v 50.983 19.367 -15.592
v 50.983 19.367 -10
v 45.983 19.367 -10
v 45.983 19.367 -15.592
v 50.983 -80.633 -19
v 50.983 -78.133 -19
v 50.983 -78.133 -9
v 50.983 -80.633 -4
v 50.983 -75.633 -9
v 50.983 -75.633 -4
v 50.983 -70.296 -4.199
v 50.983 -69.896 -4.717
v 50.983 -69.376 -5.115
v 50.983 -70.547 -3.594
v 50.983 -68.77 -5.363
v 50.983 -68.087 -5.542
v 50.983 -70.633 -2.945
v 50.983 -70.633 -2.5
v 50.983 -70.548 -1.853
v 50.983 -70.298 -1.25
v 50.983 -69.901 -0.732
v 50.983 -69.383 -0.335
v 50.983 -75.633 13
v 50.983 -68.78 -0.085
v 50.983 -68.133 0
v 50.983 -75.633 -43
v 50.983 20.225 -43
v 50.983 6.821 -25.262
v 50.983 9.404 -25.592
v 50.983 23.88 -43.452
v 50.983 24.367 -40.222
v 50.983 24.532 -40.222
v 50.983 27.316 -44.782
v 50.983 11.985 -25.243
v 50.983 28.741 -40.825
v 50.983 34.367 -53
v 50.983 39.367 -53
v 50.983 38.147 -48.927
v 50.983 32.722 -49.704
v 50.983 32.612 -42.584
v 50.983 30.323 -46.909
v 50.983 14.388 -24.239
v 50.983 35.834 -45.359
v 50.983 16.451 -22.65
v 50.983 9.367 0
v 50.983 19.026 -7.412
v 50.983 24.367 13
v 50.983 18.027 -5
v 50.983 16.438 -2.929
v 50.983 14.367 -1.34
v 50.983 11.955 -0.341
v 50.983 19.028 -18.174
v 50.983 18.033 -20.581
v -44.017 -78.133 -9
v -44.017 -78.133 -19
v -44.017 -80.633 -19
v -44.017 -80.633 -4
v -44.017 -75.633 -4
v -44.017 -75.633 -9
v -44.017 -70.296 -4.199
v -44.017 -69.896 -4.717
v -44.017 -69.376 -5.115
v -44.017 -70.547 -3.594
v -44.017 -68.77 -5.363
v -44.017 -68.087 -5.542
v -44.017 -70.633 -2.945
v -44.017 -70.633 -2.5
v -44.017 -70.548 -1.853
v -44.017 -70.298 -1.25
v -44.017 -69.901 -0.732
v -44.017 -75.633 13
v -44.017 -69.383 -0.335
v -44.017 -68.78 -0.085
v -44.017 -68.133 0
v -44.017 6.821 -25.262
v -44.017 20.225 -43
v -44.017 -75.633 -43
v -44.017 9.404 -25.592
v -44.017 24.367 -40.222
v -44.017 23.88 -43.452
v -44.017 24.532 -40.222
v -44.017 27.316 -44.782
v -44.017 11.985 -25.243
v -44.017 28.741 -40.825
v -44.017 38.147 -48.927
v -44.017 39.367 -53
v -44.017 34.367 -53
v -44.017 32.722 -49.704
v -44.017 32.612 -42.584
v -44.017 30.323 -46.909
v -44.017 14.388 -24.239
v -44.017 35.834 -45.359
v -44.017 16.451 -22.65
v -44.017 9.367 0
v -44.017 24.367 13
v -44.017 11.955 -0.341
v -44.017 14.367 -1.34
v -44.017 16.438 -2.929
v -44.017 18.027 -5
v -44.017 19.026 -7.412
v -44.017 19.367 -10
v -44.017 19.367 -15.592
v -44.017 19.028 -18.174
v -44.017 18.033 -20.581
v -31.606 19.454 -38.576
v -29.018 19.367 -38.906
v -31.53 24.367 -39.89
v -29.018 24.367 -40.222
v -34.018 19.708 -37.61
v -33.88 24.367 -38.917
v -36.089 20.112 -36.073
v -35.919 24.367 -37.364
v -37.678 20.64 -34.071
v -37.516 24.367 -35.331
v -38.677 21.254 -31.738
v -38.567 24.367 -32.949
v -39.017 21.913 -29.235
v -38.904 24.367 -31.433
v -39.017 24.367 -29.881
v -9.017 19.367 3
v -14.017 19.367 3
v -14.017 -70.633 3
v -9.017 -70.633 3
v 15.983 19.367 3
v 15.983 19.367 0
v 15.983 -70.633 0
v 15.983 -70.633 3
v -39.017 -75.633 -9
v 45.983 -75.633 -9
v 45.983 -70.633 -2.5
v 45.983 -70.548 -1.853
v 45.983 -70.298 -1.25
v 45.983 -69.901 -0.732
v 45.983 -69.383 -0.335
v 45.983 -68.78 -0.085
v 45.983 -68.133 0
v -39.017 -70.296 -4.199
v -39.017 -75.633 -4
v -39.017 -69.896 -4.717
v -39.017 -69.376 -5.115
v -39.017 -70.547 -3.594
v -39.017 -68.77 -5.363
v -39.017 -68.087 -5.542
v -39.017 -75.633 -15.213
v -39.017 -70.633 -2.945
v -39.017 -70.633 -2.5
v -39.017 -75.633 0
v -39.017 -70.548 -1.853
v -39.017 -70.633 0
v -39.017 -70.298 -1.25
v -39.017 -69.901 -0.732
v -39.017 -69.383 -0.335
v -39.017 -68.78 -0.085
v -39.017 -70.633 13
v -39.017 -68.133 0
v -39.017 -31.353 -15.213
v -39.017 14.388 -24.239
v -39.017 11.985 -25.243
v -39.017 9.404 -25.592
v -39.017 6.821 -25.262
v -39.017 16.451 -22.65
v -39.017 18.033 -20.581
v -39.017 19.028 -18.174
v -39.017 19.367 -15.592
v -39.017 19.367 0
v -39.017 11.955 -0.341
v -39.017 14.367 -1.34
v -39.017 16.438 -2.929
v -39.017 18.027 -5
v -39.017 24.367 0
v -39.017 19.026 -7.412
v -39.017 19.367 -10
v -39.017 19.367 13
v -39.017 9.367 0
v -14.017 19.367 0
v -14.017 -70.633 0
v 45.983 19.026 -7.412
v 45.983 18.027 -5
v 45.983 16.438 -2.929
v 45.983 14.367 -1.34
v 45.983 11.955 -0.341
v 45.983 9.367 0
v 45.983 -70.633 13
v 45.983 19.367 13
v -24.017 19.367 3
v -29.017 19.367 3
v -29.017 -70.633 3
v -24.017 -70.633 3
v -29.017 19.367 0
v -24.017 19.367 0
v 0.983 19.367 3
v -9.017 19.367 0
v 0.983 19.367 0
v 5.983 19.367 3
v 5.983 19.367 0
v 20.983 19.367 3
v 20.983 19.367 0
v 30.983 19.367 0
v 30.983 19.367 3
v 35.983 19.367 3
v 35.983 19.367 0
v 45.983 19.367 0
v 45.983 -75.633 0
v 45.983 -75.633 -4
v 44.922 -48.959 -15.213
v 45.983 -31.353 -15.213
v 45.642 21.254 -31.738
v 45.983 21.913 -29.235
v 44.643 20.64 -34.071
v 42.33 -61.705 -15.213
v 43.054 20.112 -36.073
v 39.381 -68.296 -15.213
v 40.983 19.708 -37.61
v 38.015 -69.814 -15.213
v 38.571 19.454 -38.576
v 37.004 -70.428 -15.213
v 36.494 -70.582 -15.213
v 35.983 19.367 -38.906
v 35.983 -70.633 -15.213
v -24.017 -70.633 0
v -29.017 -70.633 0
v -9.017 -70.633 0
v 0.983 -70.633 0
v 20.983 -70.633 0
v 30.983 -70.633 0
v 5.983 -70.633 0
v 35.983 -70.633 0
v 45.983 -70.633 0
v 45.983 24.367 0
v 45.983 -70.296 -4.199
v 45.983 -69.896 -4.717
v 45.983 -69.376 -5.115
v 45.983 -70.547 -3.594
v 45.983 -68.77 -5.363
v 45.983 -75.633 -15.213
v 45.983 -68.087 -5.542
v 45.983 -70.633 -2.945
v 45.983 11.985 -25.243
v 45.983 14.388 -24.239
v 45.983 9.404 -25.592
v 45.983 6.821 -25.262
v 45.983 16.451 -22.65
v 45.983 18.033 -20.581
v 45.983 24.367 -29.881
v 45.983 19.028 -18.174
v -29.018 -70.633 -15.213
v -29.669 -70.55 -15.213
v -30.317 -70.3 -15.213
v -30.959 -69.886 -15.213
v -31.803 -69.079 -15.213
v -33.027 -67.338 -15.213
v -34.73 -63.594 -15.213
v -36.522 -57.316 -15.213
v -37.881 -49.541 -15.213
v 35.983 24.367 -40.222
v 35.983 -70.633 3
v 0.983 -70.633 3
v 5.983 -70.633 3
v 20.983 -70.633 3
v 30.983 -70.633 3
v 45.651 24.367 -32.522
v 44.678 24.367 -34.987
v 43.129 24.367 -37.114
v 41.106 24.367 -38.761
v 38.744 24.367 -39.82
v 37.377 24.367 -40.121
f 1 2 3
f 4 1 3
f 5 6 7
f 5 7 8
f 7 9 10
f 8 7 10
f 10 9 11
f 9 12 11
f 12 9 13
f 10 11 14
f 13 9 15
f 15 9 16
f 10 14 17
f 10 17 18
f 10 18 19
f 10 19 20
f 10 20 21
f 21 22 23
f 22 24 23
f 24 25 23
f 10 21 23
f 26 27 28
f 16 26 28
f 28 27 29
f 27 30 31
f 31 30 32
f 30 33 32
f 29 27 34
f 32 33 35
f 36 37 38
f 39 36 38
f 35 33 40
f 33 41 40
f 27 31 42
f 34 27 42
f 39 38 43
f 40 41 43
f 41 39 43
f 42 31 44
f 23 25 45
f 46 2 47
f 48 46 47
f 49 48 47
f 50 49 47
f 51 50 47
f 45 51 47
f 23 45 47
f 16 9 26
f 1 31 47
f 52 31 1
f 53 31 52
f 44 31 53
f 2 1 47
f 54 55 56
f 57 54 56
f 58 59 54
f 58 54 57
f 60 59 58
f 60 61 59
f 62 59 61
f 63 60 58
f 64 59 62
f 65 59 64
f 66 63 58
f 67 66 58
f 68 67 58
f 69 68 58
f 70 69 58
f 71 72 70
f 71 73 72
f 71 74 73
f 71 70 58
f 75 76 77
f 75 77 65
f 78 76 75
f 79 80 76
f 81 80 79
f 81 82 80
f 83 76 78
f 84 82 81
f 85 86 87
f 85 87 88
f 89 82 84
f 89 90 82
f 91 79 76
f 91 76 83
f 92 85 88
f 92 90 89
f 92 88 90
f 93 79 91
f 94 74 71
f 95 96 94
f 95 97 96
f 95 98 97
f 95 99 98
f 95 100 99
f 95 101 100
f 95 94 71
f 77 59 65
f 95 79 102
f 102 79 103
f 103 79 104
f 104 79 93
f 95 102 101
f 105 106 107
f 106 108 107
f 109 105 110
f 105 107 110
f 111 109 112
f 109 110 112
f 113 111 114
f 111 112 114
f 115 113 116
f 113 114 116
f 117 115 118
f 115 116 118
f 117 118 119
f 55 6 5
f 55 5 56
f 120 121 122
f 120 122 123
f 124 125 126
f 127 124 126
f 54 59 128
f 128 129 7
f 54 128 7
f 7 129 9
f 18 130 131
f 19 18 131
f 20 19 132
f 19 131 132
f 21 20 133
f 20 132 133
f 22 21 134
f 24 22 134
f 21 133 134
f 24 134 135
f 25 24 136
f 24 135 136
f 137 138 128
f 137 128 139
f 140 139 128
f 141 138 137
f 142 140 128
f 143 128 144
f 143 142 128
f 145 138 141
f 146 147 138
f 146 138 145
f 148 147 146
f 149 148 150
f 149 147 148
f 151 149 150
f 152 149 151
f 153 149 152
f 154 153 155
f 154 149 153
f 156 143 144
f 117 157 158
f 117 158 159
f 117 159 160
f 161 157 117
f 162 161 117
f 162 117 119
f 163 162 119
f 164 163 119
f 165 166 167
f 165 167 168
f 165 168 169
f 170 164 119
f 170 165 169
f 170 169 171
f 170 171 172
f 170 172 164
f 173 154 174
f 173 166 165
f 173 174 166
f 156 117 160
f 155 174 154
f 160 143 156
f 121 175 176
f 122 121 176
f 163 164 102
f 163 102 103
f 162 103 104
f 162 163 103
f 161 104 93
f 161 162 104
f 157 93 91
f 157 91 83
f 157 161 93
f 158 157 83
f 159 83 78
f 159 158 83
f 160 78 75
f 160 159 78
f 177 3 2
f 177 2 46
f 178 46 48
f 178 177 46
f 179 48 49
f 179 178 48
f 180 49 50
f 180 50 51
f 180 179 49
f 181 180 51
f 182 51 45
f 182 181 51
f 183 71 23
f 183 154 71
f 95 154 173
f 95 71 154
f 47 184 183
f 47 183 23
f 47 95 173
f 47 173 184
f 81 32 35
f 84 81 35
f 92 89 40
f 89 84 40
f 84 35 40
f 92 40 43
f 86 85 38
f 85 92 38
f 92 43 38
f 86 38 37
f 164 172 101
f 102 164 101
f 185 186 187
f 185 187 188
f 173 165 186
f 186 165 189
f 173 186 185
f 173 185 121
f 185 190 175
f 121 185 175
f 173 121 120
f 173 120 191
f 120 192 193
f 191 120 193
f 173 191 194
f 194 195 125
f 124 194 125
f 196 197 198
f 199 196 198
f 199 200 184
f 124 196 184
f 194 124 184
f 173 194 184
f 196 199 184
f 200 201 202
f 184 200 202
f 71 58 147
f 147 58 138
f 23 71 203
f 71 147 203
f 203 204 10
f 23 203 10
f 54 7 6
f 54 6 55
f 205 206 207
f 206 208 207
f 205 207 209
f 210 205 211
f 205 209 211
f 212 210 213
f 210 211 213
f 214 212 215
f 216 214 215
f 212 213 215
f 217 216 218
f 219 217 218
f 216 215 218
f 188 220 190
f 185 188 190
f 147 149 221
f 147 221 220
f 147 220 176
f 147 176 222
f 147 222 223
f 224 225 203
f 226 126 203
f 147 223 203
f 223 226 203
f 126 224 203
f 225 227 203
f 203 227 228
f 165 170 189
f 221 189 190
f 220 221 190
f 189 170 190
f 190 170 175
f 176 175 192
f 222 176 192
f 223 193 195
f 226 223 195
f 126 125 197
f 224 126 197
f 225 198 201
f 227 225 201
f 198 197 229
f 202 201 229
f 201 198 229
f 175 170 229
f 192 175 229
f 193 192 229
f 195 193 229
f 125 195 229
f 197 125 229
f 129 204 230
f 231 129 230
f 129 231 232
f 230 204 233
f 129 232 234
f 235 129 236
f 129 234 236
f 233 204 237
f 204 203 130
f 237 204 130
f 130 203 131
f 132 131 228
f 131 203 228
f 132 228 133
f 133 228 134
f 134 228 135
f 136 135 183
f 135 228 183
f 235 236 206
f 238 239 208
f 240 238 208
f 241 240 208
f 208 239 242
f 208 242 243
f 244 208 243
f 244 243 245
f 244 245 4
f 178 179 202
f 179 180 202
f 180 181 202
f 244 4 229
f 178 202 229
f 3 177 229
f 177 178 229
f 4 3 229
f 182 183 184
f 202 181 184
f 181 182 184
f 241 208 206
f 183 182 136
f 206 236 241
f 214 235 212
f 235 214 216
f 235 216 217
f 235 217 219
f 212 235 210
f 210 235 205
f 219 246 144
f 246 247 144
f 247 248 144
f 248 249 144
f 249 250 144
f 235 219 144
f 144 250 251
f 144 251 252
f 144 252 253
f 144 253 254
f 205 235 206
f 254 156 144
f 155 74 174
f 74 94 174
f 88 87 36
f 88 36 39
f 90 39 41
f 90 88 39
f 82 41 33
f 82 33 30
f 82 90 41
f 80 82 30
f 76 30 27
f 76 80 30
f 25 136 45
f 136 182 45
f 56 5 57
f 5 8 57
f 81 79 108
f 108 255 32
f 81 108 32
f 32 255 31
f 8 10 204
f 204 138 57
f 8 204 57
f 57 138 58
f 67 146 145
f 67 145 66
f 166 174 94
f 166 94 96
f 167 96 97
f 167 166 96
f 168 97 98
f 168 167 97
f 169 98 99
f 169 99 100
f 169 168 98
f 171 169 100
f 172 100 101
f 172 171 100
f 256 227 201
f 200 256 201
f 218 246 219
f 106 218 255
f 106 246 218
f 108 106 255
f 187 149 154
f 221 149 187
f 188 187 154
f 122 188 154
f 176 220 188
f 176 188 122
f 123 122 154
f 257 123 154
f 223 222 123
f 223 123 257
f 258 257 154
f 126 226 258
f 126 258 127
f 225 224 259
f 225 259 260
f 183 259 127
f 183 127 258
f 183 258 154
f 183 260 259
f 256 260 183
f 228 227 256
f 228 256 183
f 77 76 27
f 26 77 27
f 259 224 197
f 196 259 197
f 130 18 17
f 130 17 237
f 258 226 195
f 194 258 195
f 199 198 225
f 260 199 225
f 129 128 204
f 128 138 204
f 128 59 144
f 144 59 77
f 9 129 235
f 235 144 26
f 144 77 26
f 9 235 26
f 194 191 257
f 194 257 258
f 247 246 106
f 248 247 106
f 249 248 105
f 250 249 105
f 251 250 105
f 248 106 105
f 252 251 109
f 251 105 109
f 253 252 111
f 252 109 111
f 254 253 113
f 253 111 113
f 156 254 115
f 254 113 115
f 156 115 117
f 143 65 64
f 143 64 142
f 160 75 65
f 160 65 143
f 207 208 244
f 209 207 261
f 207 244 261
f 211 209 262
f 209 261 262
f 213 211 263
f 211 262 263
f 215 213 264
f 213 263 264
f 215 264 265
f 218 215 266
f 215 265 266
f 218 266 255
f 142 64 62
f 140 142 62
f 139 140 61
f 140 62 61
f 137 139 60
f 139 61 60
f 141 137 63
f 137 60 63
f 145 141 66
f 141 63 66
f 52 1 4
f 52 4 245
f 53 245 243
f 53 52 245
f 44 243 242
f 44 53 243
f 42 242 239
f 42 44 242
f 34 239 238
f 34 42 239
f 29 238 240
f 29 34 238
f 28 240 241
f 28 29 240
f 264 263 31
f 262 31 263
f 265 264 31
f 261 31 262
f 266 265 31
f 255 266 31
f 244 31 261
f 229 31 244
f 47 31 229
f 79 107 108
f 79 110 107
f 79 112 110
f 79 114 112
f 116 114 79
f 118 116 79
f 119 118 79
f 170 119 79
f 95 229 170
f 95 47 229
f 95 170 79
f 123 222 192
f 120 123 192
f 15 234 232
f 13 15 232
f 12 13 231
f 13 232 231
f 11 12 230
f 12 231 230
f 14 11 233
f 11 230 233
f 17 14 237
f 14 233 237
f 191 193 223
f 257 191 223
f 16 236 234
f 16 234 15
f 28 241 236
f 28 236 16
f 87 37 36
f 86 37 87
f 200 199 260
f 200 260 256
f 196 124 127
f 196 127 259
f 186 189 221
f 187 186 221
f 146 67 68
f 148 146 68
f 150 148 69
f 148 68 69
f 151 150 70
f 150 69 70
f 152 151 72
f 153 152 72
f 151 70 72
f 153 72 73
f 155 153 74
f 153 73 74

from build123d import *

# Parameters (mm, degrees)
SKETCH1_W                = 5
SKETCH1_H                = 90
SKETCH1_H_2              = 5
SKETCH1_W_2              = 10
BOSS_EXTRUDE1_DEPTH      = 3
SKETCH1_3_W              = 5
SKETCH1_3_H              = 5
SKETCH1_3_H_2            = 90
SKETCH1_3_W_2            = 10
BOSS_EXTRUDE2_DEPTH      = 13
SKETCH2_W                = 5
SKETCH2_H                = 5
BOSS_EXTRUDE3_DEPTH      = 33
BOSS_EXTRUDE4_DEPTH      = 10
BOSS_EXTRUDE4_DEPTH_BACK = 17.787183465
SKETCH3_W                = 95
SKETCH3_H                = 100
SKETCH7_W                = 85
SKETCH7_H                = 5
SKETCH7_W_2              = 5
BOSS_EXTRUDE6_DEPTH      = 5
SKETCH8_W                = 95
SKETCH8_H                = 2.5
BOSS_EXTRUDE7_DEPTH      = 10
CUT_EXTRUDE1_DEPTH       = 132.816960102
BOSS_EXTRUDE9_REACH      = 101.483
SKETCH9_W                = 5
SKETCH9_H                = 5
SKETCH11_W               = 5
SKETCH11_H               = 93.06639607
BOSS_EXTRUDE12_DEPTH     = 10
SKETCH13_W               = 5
SKETCH13_H               = 10
BOSS_EXTRUDE13_DEPTH     = 4
FILLET2_R                = 10
FILLET3_START            = -44.017467249
FILLET3_DEPTH            = 5
FILLET3_START_2          = 45.982532751
FILLET3_2_DEPTH          = 5
FILLET4_R                = 10
SKETCH14_W               = 95
SKETCH14_H               = 2.777998613
BOSS_EXTRUDE14_DEPTH     = 15
SKETCH15_W               = 95
SKETCH15_H               = 5
BOSS_EXTRUDE15_DEPTH     = 10
FILLET5_R                = 15


with BuildPart() as part:
    # Sketch1 → Boss-Extrude1 (new body)
    with BuildSketch(Plane.XY):
        with Locations((48.482532751, -25.633187773)):
            Rectangle(SKETCH1_W, SKETCH1_H)
        with Locations((48.482532751, 21.866812227)):
            Rectangle(SKETCH1_W, SKETCH1_H_2)
        with Locations((40.982532751, 21.866812227)):
            Rectangle(SKETCH1_W_2, SKETCH1_H_2)
        with Locations((33.482532751, 21.866812227)):
            Rectangle(SKETCH1_W, SKETCH1_H_2)
        with Locations((33.482532751, -25.633187773)):
            Rectangle(SKETCH1_W, SKETCH1_H)
        with Locations((18.482532751, -25.633187773)):
            Rectangle(SKETCH1_W, SKETCH1_H)
        with Locations((18.482532751, 21.866812227)):
            Rectangle(SKETCH1_W, SKETCH1_H_2)
        with Locations((25.982532751, 21.866812227)):
            Rectangle(SKETCH1_W_2, SKETCH1_H_2)
        with Locations((10.982532751, 21.866812227)):
            Rectangle(SKETCH1_W_2, SKETCH1_H_2)
        with Locations((3.482532751, 21.866812227)):
            Rectangle(SKETCH1_W, SKETCH1_H_2)
        with Locations((3.482532751, -25.633187773)):
            Rectangle(SKETCH1_W, SKETCH1_H)
        with Locations((-4.017467249, 21.866812227)):
            Rectangle(SKETCH1_W_2, SKETCH1_H_2)
        with Locations((-11.517467249, 21.866812227)):
            Rectangle(SKETCH1_W, SKETCH1_H_2)
        with Locations((-11.517467249, -25.633187773)):
            Rectangle(SKETCH1_W, SKETCH1_H)
        with Locations((-19.017467249, 21.866812227)):
            Rectangle(SKETCH1_W_2, SKETCH1_H_2)
        with Locations((-26.517467249, 21.866812227)):
            Rectangle(SKETCH1_W, SKETCH1_H_2)
        with Locations((-26.517467249, -25.633187773)):
            Rectangle(SKETCH1_W, SKETCH1_H)
        with Locations((-34.017467249, 21.866812227)):
            Rectangle(SKETCH1_W_2, SKETCH1_H_2)
        with Locations((-41.517467249, 21.866812227)):
            Rectangle(SKETCH1_W, SKETCH1_H_2)
        with Locations((-41.517467249, -25.633187773)):
            Rectangle(SKETCH1_W, SKETCH1_H)
        with Locations((48.482532751, -73.133187773)):
            Rectangle(SKETCH1_W, SKETCH1_H_2)
        with Locations((40.982532751, -73.133187773)):
            Rectangle(SKETCH1_W_2, SKETCH1_H_2)
        with Locations((33.482532751, -73.133187773)):
            Rectangle(SKETCH1_W, SKETCH1_H_2)
        with Locations((25.982532751, -73.133187773)):
            Rectangle(SKETCH1_W_2, SKETCH1_H_2)
        with Locations((18.482532751, -73.133187773)):
            Rectangle(SKETCH1_W, SKETCH1_H_2)
        with Locations((10.982532751, -73.133187773)):
            Rectangle(SKETCH1_W_2, SKETCH1_H_2)
        with Locations((3.482532751, -73.133187773)):
            Rectangle(SKETCH1_W, SKETCH1_H_2)
        with Locations((-4.017467249, -73.133187773)):
            Rectangle(SKETCH1_W_2, SKETCH1_H_2)
        with Locations((-11.517467249, -73.133187773)):
            Rectangle(SKETCH1_W, SKETCH1_H_2)
        with Locations((-19.017467249, -73.133187773)):
            Rectangle(SKETCH1_W_2, SKETCH1_H_2)
        with Locations((-26.517467249, -73.133187773)):
            Rectangle(SKETCH1_W, SKETCH1_H_2)
        with Locations((-34.017467249, -73.133187773)):
            Rectangle(SKETCH1_W_2, SKETCH1_H_2)
        with Locations((-41.517467249, -73.133187773)):
            Rectangle(SKETCH1_W, SKETCH1_H_2)
    extrude(amount=BOSS_EXTRUDE1_DEPTH)

    # Sketch1<3> → Boss-Extrude2 (add)
    with BuildSketch(Plane.XY):
        with Locations((48.482532751, 21.866812227)):
            Rectangle(SKETCH1_3_W, SKETCH1_3_H)
        with Locations((48.482532751, -25.633187773)):
            Rectangle(SKETCH1_3_W, SKETCH1_3_H_2)
        with Locations((48.482532751, -73.133187773)):
            Rectangle(SKETCH1_3_W, SKETCH1_3_H)
        with Locations((40.982532751, 21.866812227)):
            Rectangle(SKETCH1_3_W_2, SKETCH1_3_H)
        with Locations((33.482532751, 21.866812227)):
            Rectangle(SKETCH1_3_W, SKETCH1_3_H)
        with Locations((25.982532751, 21.866812227)):
            Rectangle(SKETCH1_3_W_2, SKETCH1_3_H)
        with Locations((18.482532751, 21.866812227)):
            Rectangle(SKETCH1_3_W, SKETCH1_3_H)
        with Locations((10.982532751, 21.866812227)):
            Rectangle(SKETCH1_3_W_2, SKETCH1_3_H)
        with Locations((3.482532751, 21.866812227)):
            Rectangle(SKETCH1_3_W, SKETCH1_3_H)
        with Locations((-4.017467249, 21.866812227)):
            Rectangle(SKETCH1_3_W_2, SKETCH1_3_H)
        with Locations((-11.517467249, 21.866812227)):
            Rectangle(SKETCH1_3_W, SKETCH1_3_H)
        with Locations((-19.017467249, 21.866812227)):
            Rectangle(SKETCH1_3_W_2, SKETCH1_3_H)
        with Locations((-26.517467249, 21.866812227)):
            Rectangle(SKETCH1_3_W, SKETCH1_3_H)
        with Locations((-34.017467249, 21.866812227)):
            Rectangle(SKETCH1_3_W_2, SKETCH1_3_H)
        with Locations((-41.517467249, 21.866812227)):
            Rectangle(SKETCH1_3_W, SKETCH1_3_H)
        with Locations((-41.517467249, -25.633187773)):
            Rectangle(SKETCH1_3_W, SKETCH1_3_H_2)
        with Locations((-41.517467249, -73.133187773)):
            Rectangle(SKETCH1_3_W, SKETCH1_3_H)
        with Locations((40.982532751, -73.133187773)):
            Rectangle(SKETCH1_3_W_2, SKETCH1_3_H)
        with Locations((33.482532751, -73.133187773)):
            Rectangle(SKETCH1_3_W, SKETCH1_3_H)
        with Locations((25.982532751, -73.133187773)):
            Rectangle(SKETCH1_3_W_2, SKETCH1_3_H)
        with Locations((18.482532751, -73.133187773)):
            Rectangle(SKETCH1_3_W, SKETCH1_3_H)
        with Locations((10.982532751, -73.133187773)):
            Rectangle(SKETCH1_3_W_2, SKETCH1_3_H)
        with Locations((3.482532751, -73.133187773)):
            Rectangle(SKETCH1_3_W, SKETCH1_3_H)
        with Locations((-4.017467249, -73.133187773)):
            Rectangle(SKETCH1_3_W_2, SKETCH1_3_H)
        with Locations((-11.517467249, -73.133187773)):
            Rectangle(SKETCH1_3_W, SKETCH1_3_H)
        with Locations((-19.017467249, -73.133187773)):
            Rectangle(SKETCH1_3_W_2, SKETCH1_3_H)
        with Locations((-26.517467249, -73.133187773)):
            Rectangle(SKETCH1_3_W, SKETCH1_3_H)
        with Locations((-34.017467249, -73.133187773)):
            Rectangle(SKETCH1_3_W_2, SKETCH1_3_H)
    extrude(amount=BOSS_EXTRUDE2_DEPTH)

    # Sketch2 → Boss-Extrude3 (add)
    with BuildSketch(Plane(origin=(0, 0, 0), x_dir=(-1, 0, 0), z_dir=(0, 0, -1))):
        with Locations((-48.482532751, 21.866812227)):
            Rectangle(SKETCH2_W, SKETCH2_H)
        with Locations((41.517467249, 21.866812227)):
            Rectangle(SKETCH2_W, SKETCH2_H)
        with Locations((41.517467249, -73.133187773)):
            Rectangle(SKETCH2_W, SKETCH2_H)
        with Locations((-48.482532751, -73.133187773)):
            Rectangle(SKETCH2_W, SKETCH2_H)
    extrude(amount=BOSS_EXTRUDE3_DEPTH)

    # Sketch3 → Boss-Extrude4 (add, two sides: drawn at the far end of the back side and taken through both)
    with BuildSketch(Plane(origin=(0, 0, -33), x_dir=(-1, 0, 0), z_dir=(0, 0, -1)).offset(-BOSS_EXTRUDE4_DEPTH_BACK)):
        with Locations((-3.482532751, -25.633187773)):
            Rectangle(SKETCH3_W, SKETCH3_H)
    extrude(amount=BOSS_EXTRUDE4_DEPTH + BOSS_EXTRUDE4_DEPTH_BACK)

    # Sketch7 → Boss-Extrude6 (add)
    with BuildSketch(Plane.XZ.offset(75.633187773)):
        with Locations((3.482532751, -6.5)):
            Rectangle(SKETCH7_W, SKETCH7_H)
        with Locations((48.482532751, -6.5)):
            Rectangle(SKETCH7_W_2, SKETCH7_H)
        with Locations((-41.517467249, -6.5)):
            Rectangle(SKETCH7_W_2, SKETCH7_H)
    extrude(amount=BOSS_EXTRUDE6_DEPTH)

    # Sketch8 → Boss-Extrude7 (add)
    with BuildSketch(Plane(origin=(0, 0, -9), x_dir=(-1, 0, 0), z_dir=(0, 0, -1))):
        with Locations((-3.482532751, -79.383187773)):
            Rectangle(SKETCH8_W, SKETCH8_H)
    extrude(amount=BOSS_EXTRUDE7_DEPTH)

    # Sketch5 → Cut-Extrude1 (cut, through all)
    with BuildSketch(Plane.ZY.offset(44.017467249)):
        Polygon((-15.212816535, -70.633187773), (-40.222001387, 24.366812227), (-15.212816535, 24.366812227), align=None)
    extrude(amount=-CUT_EXTRUDE1_DEPTH, mode=Mode.SUBTRACT)

    # Sketch9 → Boss-Extrude9 (add, up to next)
    with BuildSketch(Plane(origin=(0, 0, -15.212816535), x_dir=(-1, 0, 0), z_dir=(0, 0, -1)), mode=Mode.PRIVATE) as boss_extrude9_sk1:
        with Locations((41.517467249, 21.866812227)):
            Rectangle(SKETCH9_W, SKETCH9_H)
    boss_extrude9_tool1 = extrude(boss_extrude9_sk1.sketch, amount=BOSS_EXTRUDE9_REACH, mode=Mode.PRIVATE) - part.part
    # Sketch9 → Boss-Extrude9 (add, up to next)
    with BuildSketch(Plane(origin=(0, 0, -15.212816535), x_dir=(-1, 0, 0), z_dir=(0, 0, -1)), mode=Mode.PRIVATE) as boss_extrude9_sk2:
        with Locations((-48.482532751, 21.866812227)):
            Rectangle(SKETCH9_W, SKETCH9_H)
    boss_extrude9_tool2 = extrude(boss_extrude9_sk2.sketch, amount=BOSS_EXTRUDE9_REACH, mode=Mode.PRIVATE) - part.part
    add(boss_extrude9_tool1.solids().sort_by_distance((-41.517467, 21.866812, -15.212817))[0])
    add(boss_extrude9_tool2.solids().sort_by_distance((48.482533, 21.866812, -15.212817))[0])

    # Sketch11 → Boss-Extrude12 (add)
    with BuildSketch(Plane(origin=(0, -8.323116729, -31.616227955), x_dir=(1, 0, 0), z_dir=(0, 0.2545807398296556, 0.9670515223646491))):
        with Locations((-41.517467249, -17.899843642)):
            Rectangle(SKETCH11_W, SKETCH11_H)
        with Locations((48.482532751, -17.899843642)):
            Rectangle(SKETCH11_W, SKETCH11_H)
    extrude(amount=BOSS_EXTRUDE12_DEPTH)

    # Sketch13 → Boss-Extrude13 (add)
    with BuildSketch(Plane(origin=(0, -62.310071044, 16.40341142), x_dir=(1, 0, 0), z_dir=(0, -0.9670515223646491, 0.2545807398296557))):
        with Locations((48.482532751, -27.69342659)):
            Rectangle(SKETCH13_W, SKETCH13_H)
        with Locations((-41.517467249, -27.69342659)):
            Rectangle(SKETCH13_W, SKETCH13_H)
    extrude(amount=BOSS_EXTRUDE13_DEPTH)

    # Fillet2
    # the kernel refuses this fillet: 10 mm, written as the material it adds along each edge
    with BuildSketch(Plane(origin=(45.982532751, 19.366812227, 0), x_dir=(0, 0, -1), z_dir=(1, 0, 0)), Plane(origin=(-39.017467249, 19.366812227, 0), x_dir=(0, -1, 0), z_dir=(-1, 0, 0))) as fillet2_piece_1:
        with BuildLine():
            CenterArc((FILLET2_R, -FILLET2_R), FILLET2_R, 90, 90)
            Line((0, -FILLET2_R), (0, 0))
            Line((0, 0), (FILLET2_R, 0))
        make_face()
    extrude(amount=5)
    with BuildSketch(Plane(origin=(-39.017467249, 19.366812227, -28.565017825), x_dir=(0, -0.9670515223646489, 0.25458073982965584), z_dir=(-1, 0, 0))) as fillet2_piece_2:
        with BuildLine():
            CenterArc((FILLET2_R * 1.29732564482, FILLET2_R), FILLET2_R, 165.251256556, 104.748743444)
            Line((FILLET2_R * 0.330274122459, FILLET2_R * 1.25458073983), (0, 0))
            Line((0, 0), (FILLET2_R * 1.29732564482, 0))
        make_face()
    extrude(amount=5)
    with BuildSketch(Plane(origin=(50.982532751, 19.366812227, -28.565017825), x_dir=(0, 0, 1), z_dir=(-1, 0, 0))) as fillet2_piece_3:
        with BuildLine():
            CenterArc((FILLET2_R * 1.29732564482, -FILLET2_R), FILLET2_R, 90, 104.748743444)
            Line((FILLET2_R * 0.330274122459, -FILLET2_R * 1.25458073983), (0, 0))
            Line((0, 0), (FILLET2_R * 1.29732564482, 0))
        make_face()
    extrude(amount=5)

    # Fillet3: read off the stored shape, not the designer's step
    # Fillet3 outline → Fillet3 (add)
    with BuildSketch(Plane.YZ.offset(FILLET3_START)):
        with BuildLine():
            Line((-70.633187773, -4.872105861), (-68.769639622, -5.362693442))
            ThreePointArc((-68.769639622, -5.362693442), (-70.113229391, -4.471313367), (-70.633187773, -2.945064636))
            Line((-70.633187773, -2.945064636), (-70.633187773, -4.872105861))
        make_face()
        with BuildLine():
            Line((-70.633187773, 0), (-70.633187773, -2.5))
            ThreePointArc((-70.633187773, -2.5), (-69.900954726, -0.732233047), (-68.133187773, 0))
            Line((-68.133187773, 0), (-70.633187773, 0))
        make_face()
    extrude(amount=FILLET3_DEPTH)

    # Fillet3 2 outline → Fillet3 2 (add)
    with BuildSketch(Plane.YZ.offset(FILLET3_START_2)):
        with BuildLine():
            Line((-70.633187773, -4.872105861), (-68.769639622, -5.362693442))
            ThreePointArc((-68.769639622, -5.362693442), (-70.113229391, -4.471313367), (-70.633187773, -2.945064636))
            Line((-70.633187773, -2.945064636), (-70.633187773, -4.872105861))
        make_face()
        with BuildLine():
            Line((-70.633187773, 0), (-70.633187773, -2.5))
            ThreePointArc((-70.633187773, -2.5), (-69.900954726, -0.732233047), (-68.133187773, 0))
            Line((-68.133187773, 0), (-70.633187773, 0))
        make_face()
    extrude(amount=FILLET3_2_DEPTH)

    # Fillet4
    fillet4_edges = [part.edges().sort_by_distance(p)[0] for p in [
        (-39.017467249, -23.133187773, -27.717408961),
        (45.982532751, -23.133187773, -27.717408961),
    ]]
    fillet(fillet4_edges, radius=FILLET4_R - 0.0001)  # a hair under: the kernel refuses the full size

    # Sketch14 → Boss-Extrude14 (add)
    with BuildSketch(Plane(origin=(0, 24.366812227, 0), x_dir=(1, 0, 0), z_dir=(0, 1, 0))):
        with Locations((3.482532751, 41.611000694)):
            Rectangle(SKETCH14_W, SKETCH14_H)
    extrude(amount=BOSS_EXTRUDE14_DEPTH)

    # Sketch15 → Boss-Extrude15 (add)
    with BuildSketch(Plane(origin=(0, 0, -43), x_dir=(-1, 0, 0), z_dir=(0, 0, -1))):
        with Locations((-3.482532751, 36.866812227)):
            Rectangle(SKETCH15_W, SKETCH15_H)
    extrude(amount=BOSS_EXTRUDE15_DEPTH)

    # Fillet5
    # the kernel refuses this fillet: 15 mm, written as the material it adds along each edge
    with BuildSketch(Plane(origin=(-44.017467249, 34.366812227, -43), x_dir=(0, 0, -1), z_dir=(1, 0, 0))) as fillet5_piece_1:
        with BuildLine():
            CenterArc((15, -14.142135624), FILLET5_R, 109.471220634, 70.528779366)
            Line((0, -14.142135624), (-0.3, -14.142135624))
            Line((-0.3, -14.142135624), (-0.3, 0))
            Line((-0.3, 0), (0, 0.3))
            ThreePointArc((0, 0.3), (5, 0.3), (9.9, 0.282842712))
            Line((9.9, 0.282842712), (10, 0))
        make_face()
    extrude(amount=95)
    # the kernel refuses this fillet: 15 mm, written as the material it takes off along each edge
    with BuildSketch(Plane(origin=(88.06880968, 39.366812227, -40.222001387), x_dir=(0, -1, 0), z_dir=(-1, 0, 0))) as fillet5_2_piece_1:
        with BuildLine():
            CenterArc((14.834510772, -15), FILLET5_R, 90, 81.481228686)
            Line((0, -12.777998613), (-0.296690215, -12.733558585))
            ThreePointArc((-0.296690215, -12.733558585), (-0.3, -6.388999307), (-0.3, 0))
            Line((-0.3, 0), (0, 0.3))
            Line((0, 0.3), (14.834510772, 0.3))
            Line((14.834510772, 0.3), (14.834510772, 0))
        make_face()
    extrude(amount=169.172553859, mode=Mode.SUBTRACT)


solid = part.part
